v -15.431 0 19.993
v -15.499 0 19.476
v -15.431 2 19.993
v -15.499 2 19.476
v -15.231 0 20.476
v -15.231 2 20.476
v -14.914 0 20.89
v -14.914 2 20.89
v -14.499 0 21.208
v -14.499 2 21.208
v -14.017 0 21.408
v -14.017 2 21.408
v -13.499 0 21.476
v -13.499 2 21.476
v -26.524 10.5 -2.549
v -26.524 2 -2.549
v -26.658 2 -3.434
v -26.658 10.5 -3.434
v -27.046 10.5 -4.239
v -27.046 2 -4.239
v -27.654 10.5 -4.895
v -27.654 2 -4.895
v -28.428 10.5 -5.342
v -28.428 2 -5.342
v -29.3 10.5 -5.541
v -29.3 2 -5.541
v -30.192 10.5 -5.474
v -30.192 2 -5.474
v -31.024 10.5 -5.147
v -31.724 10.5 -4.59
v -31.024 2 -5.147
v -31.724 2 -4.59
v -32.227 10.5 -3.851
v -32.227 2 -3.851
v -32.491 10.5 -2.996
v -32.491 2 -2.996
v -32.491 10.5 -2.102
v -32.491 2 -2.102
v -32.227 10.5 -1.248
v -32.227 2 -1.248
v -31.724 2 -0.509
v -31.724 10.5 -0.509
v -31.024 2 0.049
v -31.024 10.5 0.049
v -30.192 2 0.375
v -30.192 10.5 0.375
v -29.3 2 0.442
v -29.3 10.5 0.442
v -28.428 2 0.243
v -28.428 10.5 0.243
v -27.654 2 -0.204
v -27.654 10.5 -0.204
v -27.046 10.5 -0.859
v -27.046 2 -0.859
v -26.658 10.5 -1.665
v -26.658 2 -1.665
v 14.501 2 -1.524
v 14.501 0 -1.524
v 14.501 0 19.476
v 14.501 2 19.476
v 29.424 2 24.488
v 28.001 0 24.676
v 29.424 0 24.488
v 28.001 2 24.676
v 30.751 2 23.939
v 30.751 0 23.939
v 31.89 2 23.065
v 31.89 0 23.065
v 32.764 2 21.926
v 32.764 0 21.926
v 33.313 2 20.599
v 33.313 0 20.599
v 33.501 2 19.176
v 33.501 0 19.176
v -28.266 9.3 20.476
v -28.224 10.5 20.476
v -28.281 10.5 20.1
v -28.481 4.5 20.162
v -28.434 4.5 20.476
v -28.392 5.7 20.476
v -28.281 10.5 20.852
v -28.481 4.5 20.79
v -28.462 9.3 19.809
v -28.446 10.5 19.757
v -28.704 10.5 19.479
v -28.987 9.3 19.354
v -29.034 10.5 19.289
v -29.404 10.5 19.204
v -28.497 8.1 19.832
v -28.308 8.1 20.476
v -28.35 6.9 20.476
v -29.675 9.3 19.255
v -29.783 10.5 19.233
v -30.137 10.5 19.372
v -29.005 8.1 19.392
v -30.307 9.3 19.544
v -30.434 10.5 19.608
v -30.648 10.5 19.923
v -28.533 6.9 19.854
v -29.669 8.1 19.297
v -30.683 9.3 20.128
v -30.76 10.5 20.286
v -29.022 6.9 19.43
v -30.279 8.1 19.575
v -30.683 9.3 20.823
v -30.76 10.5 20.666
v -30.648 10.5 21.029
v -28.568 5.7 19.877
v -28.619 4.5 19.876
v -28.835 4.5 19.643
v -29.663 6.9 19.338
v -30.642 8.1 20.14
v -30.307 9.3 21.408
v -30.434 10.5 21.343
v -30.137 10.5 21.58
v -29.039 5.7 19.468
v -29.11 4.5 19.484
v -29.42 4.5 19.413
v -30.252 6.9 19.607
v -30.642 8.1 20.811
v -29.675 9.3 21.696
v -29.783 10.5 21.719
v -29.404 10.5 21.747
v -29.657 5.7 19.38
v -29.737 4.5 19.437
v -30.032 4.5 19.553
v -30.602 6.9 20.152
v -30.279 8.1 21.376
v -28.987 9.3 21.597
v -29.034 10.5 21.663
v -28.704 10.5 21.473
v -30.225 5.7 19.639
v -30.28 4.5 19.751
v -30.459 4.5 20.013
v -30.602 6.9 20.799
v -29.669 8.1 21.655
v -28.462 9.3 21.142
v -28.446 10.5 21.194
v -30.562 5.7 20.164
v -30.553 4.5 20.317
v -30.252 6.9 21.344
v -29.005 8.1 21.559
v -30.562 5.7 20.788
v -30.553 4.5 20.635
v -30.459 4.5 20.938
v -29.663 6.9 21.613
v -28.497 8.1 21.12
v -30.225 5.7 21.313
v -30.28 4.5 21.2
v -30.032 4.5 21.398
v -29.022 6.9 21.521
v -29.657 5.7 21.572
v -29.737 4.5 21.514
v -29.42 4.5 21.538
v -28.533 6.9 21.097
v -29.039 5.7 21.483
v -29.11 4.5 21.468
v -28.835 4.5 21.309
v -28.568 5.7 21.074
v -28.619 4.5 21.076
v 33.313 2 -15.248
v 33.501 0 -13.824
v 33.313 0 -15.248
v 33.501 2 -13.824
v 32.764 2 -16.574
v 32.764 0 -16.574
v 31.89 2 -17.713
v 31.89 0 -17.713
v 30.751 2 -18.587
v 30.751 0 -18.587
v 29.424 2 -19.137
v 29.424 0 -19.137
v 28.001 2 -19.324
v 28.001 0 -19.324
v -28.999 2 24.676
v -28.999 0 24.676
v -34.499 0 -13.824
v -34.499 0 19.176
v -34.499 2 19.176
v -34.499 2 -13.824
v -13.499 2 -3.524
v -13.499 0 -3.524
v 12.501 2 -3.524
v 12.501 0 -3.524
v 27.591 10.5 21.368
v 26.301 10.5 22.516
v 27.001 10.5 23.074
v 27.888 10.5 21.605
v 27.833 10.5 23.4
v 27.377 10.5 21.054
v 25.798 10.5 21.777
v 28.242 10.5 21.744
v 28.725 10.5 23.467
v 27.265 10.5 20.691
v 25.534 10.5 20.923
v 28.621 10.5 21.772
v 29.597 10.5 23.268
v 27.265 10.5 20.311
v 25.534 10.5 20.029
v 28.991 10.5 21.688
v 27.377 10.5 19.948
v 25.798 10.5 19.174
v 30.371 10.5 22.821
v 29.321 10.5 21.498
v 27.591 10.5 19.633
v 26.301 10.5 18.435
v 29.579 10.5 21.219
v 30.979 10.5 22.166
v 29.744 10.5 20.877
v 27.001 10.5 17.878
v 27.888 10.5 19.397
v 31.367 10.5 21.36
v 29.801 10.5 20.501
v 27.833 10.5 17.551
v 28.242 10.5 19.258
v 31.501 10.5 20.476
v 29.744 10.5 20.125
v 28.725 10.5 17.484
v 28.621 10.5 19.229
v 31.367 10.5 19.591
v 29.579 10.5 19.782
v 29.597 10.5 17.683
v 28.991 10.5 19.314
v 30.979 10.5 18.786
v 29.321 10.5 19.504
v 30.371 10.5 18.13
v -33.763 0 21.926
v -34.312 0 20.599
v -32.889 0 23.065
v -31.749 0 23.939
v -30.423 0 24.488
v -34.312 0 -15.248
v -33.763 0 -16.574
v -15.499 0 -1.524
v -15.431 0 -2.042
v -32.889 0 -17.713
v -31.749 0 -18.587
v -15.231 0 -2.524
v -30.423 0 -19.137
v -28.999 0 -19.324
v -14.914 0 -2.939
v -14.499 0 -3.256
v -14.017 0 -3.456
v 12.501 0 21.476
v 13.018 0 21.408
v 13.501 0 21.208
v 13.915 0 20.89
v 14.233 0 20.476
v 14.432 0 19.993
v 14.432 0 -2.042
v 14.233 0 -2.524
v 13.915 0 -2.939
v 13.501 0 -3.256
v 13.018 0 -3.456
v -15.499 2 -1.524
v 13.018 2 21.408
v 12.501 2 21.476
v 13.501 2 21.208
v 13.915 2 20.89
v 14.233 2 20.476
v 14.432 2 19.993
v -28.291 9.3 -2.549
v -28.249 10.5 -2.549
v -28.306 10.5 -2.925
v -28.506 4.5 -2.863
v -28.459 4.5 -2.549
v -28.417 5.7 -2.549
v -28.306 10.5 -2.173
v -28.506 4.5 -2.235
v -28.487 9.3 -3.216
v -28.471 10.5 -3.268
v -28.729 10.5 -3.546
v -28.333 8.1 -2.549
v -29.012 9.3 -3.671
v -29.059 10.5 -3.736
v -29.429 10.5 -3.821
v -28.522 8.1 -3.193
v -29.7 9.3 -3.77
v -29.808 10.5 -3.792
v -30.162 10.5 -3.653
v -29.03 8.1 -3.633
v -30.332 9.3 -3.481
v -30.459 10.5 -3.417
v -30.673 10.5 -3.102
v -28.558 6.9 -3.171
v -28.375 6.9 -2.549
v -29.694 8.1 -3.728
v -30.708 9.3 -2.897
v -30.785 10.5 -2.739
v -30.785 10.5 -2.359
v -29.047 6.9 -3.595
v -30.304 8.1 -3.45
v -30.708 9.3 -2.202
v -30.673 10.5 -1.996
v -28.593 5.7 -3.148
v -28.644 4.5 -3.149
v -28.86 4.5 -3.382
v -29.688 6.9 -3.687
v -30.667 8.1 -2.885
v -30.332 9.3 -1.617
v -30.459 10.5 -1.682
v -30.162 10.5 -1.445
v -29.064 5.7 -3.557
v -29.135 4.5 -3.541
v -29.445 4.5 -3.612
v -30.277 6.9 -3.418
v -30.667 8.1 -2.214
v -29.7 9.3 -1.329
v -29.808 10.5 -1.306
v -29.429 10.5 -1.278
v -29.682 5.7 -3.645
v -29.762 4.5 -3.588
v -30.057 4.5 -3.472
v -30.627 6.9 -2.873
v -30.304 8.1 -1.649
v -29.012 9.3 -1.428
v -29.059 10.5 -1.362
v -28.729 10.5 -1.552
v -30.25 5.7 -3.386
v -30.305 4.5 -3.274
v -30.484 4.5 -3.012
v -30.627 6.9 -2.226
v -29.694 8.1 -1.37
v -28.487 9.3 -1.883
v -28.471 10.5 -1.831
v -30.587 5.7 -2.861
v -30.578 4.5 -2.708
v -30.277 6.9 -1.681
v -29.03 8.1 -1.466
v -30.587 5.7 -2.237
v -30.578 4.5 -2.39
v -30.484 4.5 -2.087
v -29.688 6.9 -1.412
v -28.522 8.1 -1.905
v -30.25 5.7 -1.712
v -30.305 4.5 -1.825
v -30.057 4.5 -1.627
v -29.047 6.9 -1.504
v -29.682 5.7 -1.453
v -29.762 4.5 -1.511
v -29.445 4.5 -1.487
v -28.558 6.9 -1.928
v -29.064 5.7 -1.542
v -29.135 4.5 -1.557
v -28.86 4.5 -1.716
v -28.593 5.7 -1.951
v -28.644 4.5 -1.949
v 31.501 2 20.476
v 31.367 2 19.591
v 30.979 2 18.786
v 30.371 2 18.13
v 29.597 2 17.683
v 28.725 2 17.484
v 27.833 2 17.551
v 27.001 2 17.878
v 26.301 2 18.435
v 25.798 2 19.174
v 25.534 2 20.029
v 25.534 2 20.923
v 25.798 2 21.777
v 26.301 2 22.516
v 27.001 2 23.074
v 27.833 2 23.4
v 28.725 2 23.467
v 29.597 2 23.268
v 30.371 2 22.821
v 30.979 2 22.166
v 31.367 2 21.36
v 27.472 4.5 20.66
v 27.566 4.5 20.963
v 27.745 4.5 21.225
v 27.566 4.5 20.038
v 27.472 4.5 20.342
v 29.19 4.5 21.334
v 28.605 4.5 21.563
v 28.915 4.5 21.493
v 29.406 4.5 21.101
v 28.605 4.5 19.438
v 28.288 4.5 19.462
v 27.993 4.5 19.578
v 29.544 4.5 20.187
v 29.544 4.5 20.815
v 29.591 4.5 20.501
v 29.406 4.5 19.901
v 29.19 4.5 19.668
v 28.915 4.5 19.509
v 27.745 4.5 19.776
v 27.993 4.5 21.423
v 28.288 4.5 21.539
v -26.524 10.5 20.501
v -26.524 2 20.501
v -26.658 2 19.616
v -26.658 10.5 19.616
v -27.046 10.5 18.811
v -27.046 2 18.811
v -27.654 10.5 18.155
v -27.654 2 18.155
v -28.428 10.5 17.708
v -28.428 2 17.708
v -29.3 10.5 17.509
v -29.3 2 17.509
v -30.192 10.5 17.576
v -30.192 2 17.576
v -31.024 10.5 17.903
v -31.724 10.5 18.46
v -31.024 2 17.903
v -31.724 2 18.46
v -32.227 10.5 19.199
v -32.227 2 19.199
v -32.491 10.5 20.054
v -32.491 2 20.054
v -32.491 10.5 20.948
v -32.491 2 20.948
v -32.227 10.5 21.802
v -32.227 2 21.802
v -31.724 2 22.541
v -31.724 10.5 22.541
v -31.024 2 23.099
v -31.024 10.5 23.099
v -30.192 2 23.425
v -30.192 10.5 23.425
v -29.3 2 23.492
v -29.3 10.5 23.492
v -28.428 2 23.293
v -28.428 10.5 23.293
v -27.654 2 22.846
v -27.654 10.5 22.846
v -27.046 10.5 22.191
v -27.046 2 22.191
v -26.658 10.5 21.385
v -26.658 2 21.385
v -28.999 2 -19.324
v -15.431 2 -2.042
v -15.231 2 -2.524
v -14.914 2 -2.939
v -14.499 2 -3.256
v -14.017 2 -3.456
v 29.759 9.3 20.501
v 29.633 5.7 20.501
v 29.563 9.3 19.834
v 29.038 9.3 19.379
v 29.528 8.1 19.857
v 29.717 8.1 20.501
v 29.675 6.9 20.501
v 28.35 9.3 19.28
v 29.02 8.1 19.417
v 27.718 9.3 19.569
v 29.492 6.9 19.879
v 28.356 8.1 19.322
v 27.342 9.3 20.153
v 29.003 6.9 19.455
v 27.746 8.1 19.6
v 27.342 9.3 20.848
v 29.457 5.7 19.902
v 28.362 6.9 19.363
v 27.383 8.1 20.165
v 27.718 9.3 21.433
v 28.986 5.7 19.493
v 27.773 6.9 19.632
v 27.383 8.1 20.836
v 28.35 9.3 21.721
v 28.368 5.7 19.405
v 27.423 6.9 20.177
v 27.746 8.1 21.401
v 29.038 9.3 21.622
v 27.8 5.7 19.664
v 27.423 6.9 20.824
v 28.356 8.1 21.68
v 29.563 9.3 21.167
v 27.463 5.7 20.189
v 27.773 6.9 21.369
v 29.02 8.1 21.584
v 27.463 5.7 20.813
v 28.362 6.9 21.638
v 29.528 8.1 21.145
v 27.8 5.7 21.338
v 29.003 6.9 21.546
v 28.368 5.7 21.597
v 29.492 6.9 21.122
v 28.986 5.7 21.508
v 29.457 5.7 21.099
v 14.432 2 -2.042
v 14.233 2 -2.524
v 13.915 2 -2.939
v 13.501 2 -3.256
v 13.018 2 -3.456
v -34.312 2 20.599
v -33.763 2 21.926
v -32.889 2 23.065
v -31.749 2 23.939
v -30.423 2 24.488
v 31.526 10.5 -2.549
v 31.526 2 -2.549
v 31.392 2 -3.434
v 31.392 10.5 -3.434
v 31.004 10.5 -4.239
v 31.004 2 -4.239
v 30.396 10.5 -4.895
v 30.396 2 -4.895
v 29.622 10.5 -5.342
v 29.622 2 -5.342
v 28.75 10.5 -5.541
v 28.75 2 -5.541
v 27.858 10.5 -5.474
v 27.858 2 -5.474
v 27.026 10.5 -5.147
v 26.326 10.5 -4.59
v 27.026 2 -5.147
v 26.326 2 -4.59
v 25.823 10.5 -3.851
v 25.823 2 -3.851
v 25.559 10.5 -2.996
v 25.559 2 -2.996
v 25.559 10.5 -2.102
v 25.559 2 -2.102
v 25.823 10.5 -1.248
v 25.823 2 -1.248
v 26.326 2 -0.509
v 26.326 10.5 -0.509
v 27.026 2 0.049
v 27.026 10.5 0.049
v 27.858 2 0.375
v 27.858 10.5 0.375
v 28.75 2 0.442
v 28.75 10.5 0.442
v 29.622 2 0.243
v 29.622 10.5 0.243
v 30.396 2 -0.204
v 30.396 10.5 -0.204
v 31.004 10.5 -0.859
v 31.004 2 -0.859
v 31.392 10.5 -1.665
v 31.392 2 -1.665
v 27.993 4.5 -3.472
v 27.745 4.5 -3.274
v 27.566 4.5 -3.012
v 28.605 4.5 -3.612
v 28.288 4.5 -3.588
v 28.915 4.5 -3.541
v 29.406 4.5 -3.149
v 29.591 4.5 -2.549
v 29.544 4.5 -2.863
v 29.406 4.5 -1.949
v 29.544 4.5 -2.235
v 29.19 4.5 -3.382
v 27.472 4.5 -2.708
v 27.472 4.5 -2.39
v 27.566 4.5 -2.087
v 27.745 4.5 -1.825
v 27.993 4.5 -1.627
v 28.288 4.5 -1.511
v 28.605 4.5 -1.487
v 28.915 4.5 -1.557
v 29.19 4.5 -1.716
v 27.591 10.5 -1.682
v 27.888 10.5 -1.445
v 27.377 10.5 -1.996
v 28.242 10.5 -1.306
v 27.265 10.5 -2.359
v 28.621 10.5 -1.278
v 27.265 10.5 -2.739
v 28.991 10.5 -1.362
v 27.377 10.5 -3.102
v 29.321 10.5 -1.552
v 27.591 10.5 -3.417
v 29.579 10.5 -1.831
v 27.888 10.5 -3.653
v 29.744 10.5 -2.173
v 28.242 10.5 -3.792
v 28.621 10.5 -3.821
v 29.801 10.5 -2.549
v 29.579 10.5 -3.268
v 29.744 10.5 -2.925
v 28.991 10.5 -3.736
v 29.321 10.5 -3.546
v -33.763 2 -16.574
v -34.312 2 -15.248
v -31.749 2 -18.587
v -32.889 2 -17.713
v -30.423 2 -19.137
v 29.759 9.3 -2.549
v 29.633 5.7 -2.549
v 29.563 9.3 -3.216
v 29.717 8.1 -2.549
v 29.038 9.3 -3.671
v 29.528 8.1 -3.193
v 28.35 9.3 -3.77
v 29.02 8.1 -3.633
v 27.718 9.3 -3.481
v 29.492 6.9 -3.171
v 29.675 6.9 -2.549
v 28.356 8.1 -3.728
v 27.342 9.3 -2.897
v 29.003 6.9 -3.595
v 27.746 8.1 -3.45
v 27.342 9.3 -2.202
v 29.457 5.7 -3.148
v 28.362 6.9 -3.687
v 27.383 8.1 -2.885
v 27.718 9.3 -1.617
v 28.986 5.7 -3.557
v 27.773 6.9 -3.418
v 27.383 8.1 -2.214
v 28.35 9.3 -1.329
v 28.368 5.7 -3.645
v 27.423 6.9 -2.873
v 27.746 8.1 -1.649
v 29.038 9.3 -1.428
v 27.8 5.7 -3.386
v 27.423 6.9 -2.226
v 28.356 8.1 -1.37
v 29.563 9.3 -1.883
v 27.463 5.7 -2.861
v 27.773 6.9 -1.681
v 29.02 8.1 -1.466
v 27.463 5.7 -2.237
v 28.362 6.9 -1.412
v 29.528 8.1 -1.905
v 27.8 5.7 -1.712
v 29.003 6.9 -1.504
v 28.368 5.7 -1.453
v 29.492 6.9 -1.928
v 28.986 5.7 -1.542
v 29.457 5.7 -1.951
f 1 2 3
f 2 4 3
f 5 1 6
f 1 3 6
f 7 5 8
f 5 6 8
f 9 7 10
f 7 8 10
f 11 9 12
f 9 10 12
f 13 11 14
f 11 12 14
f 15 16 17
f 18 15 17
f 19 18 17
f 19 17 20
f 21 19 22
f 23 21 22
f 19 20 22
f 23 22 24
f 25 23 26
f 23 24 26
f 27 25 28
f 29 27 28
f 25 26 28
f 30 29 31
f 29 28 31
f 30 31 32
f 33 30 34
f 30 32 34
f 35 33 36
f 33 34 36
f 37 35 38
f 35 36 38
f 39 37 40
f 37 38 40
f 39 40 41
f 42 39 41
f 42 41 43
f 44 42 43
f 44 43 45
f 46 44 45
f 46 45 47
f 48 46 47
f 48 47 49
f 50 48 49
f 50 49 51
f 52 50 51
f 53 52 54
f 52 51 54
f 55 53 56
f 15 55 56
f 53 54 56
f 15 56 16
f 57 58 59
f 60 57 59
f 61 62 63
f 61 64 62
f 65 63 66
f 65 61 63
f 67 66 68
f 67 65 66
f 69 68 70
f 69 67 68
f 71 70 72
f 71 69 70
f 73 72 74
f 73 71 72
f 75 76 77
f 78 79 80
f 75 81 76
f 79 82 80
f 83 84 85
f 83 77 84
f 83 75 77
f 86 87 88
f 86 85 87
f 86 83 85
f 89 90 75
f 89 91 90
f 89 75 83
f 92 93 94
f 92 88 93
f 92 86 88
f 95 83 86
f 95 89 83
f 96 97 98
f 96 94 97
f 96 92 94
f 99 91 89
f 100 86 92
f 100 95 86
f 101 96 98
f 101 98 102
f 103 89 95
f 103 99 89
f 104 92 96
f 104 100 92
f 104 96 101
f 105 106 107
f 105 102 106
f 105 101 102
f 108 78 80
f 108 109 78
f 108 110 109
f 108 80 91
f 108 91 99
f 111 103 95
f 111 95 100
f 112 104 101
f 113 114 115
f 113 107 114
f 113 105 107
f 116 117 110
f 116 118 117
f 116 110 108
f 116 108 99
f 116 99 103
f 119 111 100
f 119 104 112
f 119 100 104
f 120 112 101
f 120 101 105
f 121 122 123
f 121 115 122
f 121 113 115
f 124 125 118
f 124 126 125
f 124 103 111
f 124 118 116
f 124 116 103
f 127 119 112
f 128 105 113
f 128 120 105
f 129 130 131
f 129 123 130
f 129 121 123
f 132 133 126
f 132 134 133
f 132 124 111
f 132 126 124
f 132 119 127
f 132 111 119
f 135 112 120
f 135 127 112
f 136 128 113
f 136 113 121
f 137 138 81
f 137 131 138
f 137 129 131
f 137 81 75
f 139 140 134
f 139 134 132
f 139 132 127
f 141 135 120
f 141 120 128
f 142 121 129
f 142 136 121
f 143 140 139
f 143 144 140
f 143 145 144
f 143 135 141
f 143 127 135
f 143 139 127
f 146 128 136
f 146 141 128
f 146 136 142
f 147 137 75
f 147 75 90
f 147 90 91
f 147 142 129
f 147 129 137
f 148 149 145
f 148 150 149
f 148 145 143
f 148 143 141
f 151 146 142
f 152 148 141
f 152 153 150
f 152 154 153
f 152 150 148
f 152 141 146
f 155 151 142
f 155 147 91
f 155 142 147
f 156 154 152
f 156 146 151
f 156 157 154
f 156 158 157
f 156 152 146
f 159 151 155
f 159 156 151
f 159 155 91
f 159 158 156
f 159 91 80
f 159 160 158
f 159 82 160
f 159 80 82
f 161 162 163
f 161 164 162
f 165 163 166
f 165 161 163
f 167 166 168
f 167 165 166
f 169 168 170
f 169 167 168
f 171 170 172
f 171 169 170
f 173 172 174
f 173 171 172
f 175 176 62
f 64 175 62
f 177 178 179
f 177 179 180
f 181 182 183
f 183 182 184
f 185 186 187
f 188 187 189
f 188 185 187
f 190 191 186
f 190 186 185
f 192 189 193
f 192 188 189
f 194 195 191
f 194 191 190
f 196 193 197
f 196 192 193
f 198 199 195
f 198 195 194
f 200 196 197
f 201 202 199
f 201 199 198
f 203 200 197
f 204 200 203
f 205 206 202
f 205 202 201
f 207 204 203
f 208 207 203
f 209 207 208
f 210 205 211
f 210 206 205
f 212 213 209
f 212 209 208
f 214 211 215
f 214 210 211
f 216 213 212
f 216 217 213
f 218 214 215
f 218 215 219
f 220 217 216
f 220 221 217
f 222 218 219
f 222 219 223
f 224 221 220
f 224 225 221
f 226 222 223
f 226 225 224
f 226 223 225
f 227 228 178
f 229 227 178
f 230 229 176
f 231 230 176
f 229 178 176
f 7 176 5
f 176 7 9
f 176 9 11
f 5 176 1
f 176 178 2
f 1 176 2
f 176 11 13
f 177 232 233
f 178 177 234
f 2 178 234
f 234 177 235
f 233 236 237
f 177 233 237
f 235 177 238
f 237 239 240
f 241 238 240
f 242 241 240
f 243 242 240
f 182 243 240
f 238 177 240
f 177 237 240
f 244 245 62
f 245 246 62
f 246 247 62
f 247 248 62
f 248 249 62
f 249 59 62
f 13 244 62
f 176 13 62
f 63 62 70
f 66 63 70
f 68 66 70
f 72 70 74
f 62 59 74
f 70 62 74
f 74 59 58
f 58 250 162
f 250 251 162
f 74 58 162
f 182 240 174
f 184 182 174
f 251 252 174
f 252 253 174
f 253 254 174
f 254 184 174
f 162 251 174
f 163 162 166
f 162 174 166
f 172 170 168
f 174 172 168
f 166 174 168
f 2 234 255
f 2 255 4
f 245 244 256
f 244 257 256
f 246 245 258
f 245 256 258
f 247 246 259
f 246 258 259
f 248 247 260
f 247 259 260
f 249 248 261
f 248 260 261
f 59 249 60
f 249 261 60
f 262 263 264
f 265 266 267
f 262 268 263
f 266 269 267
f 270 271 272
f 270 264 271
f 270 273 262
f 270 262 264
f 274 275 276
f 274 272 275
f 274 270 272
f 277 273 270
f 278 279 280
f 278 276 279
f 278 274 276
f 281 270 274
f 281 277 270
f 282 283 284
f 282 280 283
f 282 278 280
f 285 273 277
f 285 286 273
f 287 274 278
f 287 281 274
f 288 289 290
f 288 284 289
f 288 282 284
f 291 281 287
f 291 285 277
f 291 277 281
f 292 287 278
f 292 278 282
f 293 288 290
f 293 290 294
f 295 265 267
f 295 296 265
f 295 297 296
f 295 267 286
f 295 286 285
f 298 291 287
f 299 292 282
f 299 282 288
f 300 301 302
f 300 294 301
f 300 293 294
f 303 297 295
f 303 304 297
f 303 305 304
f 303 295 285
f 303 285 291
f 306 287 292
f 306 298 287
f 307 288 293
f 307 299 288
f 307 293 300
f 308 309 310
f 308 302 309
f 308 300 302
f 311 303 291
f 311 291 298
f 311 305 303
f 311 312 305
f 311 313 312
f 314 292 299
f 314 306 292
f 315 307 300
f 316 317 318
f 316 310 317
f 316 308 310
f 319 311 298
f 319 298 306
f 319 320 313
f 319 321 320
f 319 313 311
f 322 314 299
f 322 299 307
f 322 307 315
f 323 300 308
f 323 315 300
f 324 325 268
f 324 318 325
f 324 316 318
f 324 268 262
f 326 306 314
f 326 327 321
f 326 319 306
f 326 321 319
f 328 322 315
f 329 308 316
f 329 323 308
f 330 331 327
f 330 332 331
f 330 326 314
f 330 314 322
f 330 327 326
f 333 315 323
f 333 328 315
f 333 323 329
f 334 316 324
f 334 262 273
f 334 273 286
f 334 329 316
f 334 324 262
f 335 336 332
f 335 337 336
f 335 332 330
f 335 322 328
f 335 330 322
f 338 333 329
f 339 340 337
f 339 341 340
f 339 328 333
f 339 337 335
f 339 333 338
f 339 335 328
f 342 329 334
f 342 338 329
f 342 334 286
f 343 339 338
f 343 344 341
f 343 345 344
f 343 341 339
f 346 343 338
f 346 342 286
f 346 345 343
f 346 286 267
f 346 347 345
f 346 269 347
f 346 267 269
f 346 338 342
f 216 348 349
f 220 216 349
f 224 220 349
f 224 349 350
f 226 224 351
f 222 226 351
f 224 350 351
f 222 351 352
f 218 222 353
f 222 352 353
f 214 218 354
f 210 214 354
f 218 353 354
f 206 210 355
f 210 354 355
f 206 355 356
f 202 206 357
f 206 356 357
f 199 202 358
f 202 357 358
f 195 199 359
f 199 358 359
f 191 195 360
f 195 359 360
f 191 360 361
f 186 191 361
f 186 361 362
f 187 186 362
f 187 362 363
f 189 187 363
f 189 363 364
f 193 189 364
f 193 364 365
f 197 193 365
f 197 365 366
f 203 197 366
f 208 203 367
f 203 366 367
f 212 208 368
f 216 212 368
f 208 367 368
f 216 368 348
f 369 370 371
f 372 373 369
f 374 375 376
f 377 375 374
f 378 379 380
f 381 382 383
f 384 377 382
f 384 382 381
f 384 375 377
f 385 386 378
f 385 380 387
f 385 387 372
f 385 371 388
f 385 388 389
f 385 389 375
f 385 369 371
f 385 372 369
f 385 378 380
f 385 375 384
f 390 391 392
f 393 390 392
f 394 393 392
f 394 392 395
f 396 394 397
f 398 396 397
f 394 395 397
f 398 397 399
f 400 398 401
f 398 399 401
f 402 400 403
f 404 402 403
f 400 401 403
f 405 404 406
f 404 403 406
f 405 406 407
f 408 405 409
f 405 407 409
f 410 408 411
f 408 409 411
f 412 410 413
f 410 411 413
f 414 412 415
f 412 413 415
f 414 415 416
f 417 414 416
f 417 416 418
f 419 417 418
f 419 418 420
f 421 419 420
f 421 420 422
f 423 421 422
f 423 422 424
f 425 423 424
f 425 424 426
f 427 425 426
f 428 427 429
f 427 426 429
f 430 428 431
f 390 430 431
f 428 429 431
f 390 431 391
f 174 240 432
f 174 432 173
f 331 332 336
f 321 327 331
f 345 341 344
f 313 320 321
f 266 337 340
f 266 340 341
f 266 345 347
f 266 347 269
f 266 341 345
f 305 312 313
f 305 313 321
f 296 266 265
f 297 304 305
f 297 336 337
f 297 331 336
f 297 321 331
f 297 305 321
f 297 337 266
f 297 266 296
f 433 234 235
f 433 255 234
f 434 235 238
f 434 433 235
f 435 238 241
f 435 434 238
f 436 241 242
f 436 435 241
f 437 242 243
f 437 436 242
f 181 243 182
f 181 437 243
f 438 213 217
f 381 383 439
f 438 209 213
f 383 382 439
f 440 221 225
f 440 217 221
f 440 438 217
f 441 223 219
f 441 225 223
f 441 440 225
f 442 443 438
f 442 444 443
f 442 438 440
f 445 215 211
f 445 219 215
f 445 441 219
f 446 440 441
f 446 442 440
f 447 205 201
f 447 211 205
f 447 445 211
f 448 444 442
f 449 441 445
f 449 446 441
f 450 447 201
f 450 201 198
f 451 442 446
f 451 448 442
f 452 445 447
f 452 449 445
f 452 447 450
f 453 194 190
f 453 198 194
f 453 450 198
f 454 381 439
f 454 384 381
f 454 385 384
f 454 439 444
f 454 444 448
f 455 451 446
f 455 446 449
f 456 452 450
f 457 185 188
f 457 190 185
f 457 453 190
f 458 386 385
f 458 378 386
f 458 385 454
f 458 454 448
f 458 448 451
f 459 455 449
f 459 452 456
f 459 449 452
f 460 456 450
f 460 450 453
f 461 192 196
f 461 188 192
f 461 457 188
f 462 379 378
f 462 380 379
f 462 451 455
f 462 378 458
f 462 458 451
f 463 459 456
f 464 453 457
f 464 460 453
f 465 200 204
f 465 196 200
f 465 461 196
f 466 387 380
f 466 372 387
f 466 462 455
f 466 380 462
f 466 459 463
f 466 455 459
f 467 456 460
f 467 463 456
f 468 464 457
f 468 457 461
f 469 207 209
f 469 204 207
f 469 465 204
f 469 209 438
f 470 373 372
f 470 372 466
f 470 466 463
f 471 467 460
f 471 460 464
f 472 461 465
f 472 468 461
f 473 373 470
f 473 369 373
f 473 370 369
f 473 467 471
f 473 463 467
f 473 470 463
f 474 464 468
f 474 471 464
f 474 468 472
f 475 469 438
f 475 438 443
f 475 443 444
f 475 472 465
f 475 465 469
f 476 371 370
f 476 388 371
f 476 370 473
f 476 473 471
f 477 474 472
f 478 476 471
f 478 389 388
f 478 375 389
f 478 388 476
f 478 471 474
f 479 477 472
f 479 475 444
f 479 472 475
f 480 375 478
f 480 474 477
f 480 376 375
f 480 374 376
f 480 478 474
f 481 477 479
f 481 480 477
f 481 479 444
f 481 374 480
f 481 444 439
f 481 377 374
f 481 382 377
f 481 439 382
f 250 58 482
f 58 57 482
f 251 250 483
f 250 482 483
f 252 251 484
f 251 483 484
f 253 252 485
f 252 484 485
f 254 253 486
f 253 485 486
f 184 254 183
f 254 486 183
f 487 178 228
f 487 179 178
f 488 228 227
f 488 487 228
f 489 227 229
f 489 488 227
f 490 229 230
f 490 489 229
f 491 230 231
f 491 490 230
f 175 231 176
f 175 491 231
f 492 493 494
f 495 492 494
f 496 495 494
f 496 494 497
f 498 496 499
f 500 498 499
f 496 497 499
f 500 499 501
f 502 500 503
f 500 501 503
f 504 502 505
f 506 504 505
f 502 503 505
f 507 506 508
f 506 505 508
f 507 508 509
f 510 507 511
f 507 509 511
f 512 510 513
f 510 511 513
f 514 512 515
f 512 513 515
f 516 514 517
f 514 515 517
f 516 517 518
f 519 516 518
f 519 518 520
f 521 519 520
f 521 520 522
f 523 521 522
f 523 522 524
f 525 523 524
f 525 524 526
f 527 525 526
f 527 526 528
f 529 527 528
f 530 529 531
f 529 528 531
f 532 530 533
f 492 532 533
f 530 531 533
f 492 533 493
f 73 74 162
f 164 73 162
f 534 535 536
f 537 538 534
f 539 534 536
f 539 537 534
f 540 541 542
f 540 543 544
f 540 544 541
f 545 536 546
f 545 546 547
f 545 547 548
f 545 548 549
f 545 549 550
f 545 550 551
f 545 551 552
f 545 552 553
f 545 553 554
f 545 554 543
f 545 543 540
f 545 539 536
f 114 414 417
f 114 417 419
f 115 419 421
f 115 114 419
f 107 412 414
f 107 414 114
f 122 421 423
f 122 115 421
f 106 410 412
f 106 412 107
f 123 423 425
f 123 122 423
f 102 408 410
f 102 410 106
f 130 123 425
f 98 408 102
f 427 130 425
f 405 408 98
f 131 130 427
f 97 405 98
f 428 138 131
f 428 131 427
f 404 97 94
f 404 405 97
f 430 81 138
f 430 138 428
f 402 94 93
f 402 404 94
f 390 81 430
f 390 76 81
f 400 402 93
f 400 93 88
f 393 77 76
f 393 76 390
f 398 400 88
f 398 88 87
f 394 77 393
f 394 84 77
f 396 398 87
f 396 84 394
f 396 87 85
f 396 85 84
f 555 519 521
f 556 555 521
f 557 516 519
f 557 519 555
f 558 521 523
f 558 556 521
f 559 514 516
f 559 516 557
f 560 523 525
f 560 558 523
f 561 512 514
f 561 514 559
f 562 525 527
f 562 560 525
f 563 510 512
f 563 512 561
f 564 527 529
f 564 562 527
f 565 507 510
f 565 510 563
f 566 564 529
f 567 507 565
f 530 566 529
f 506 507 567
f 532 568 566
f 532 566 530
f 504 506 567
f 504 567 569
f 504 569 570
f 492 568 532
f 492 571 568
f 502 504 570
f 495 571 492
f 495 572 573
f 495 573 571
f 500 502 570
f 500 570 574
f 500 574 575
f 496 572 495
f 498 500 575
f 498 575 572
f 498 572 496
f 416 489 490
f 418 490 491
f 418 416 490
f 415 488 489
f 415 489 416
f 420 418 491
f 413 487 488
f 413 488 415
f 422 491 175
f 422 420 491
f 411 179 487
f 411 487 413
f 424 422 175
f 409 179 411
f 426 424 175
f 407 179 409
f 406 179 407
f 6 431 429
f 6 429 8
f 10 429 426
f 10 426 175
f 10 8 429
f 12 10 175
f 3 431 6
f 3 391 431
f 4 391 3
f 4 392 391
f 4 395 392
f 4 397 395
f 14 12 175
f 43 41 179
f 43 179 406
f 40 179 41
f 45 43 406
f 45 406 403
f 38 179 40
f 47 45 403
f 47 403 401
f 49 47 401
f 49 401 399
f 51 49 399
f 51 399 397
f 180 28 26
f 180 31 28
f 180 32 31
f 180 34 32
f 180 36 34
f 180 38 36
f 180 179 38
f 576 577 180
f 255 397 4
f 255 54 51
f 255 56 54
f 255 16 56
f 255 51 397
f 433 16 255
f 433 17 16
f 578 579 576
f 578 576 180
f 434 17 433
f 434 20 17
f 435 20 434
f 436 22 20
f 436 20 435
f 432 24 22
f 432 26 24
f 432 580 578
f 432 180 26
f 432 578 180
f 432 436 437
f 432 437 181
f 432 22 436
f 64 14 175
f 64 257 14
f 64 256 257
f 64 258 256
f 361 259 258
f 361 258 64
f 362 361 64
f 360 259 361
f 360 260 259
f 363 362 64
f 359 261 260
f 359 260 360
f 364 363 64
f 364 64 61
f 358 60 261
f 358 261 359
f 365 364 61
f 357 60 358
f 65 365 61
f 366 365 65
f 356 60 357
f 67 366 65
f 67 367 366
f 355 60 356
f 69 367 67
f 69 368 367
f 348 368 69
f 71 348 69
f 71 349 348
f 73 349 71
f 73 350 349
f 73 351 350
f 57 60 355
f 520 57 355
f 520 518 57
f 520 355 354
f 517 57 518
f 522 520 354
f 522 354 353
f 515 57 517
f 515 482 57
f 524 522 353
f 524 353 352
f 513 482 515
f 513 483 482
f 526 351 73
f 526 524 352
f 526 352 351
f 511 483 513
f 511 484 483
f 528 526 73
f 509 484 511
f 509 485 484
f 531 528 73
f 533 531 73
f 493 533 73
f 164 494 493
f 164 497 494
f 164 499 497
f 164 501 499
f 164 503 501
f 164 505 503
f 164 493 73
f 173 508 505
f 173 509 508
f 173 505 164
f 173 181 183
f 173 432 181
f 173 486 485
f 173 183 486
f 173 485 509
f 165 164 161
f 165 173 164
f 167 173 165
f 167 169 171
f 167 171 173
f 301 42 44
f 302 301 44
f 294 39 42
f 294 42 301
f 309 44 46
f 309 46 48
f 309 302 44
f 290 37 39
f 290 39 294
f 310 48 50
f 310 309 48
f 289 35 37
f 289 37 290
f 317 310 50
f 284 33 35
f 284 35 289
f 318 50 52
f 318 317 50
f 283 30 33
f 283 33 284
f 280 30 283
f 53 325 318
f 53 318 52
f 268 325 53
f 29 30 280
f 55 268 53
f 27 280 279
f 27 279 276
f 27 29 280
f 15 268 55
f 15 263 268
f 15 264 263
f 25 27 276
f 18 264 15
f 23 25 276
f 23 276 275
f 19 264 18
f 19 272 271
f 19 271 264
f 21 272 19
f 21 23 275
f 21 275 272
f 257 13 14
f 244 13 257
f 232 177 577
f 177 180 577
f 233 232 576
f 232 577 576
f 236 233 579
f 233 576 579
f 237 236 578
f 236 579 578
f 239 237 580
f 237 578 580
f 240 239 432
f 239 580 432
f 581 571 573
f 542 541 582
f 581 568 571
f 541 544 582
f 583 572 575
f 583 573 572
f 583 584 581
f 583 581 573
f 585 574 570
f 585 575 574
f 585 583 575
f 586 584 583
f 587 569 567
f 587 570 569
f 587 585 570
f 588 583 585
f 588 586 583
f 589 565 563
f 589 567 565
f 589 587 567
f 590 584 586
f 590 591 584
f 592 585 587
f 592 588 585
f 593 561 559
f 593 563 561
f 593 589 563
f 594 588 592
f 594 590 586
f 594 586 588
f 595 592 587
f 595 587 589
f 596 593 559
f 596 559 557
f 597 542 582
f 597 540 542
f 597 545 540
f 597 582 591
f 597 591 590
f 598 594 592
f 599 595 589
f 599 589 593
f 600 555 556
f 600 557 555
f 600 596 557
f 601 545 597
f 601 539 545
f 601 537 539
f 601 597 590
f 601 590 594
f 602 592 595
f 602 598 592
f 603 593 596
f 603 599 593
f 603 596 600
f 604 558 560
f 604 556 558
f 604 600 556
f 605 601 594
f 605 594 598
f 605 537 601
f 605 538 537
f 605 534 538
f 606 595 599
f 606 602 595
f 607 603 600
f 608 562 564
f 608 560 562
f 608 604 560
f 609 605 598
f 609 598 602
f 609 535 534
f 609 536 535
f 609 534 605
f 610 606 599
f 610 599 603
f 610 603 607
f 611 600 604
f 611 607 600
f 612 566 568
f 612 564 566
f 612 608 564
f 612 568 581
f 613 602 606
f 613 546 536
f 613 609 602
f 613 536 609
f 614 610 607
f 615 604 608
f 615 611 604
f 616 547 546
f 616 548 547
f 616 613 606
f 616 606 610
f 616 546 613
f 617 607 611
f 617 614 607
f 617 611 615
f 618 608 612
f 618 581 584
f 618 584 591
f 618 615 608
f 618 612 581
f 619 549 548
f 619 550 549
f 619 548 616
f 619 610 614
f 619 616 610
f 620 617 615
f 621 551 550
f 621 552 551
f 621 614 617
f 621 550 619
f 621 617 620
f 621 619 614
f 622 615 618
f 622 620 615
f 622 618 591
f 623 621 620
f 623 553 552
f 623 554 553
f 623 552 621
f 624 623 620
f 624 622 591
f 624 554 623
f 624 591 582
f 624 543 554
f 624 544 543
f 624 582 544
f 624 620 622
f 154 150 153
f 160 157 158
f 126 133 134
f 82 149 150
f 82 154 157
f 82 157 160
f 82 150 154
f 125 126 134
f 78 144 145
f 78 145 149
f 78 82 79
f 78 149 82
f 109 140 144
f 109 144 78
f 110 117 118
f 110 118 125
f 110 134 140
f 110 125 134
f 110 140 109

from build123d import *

# Parameters (mm, degrees)
SKETCH_1_W          = 68
SKETCH_1_H          = 44
EXTRUDE_1_DEPTH     = 2
FILLET_1_R          = 5.5
SKETCH_2_W          = 30
SKETCH_2_H          = 25
CUT_EXTRUDE_1_DEPTH = 3
FILLET_2_R          = 2
SKETCH_3_R          = 3
EXTRUDE_2_DEPTH     = 8.5
SKETCH_4_R          = 1.275
CUT_EXTRUDE_2_DEPTH = 6
CUT_EXTRUDE_2_TAPER = 2


with BuildPart() as part:
    # 草图1 → 凸台-拉伸1 (new body)
    with BuildSketch(Plane(origin=(0, 0, 0), x_dir=(1, 0, 0), z_dir=(0, 1, 0))):
        with Locations((-0.499435028, -2.675706215)):
            Rectangle(SKETCH_1_W, SKETCH_1_H)
    extrude(amount=EXTRUDE_1_DEPTH)

    # 圆角1
    fillet_1_edges = [part.edges().sort_by_distance(p)[0] for p in [
        (-34.499435028, 1, -19.324293785),
        (33.500564972, 1, -19.324293785),
        (33.500564972, 1, 24.675706215),
        (-34.499435028, 1, 24.675706215),
    ]]
    fillet(fillet_1_edges, radius=FILLET_1_R)

    # 草图2 → 切除-拉伸1 (cut, through all)
    with BuildSketch(Plane.XZ):
        with Locations((-0.499435028, 8.975706215)):
            Rectangle(SKETCH_2_W, SKETCH_2_H)
    extrude(amount=-CUT_EXTRUDE_1_DEPTH, mode=Mode.SUBTRACT)

    # 圆角2
    fillet_2_edges = [part.edges().sort_by_distance(p)[0] for p in [
        (14.500564972, 1, 21.475706215),
        (14.500564972, 1, -3.524293785),
        (-15.499435028, 1, -3.524293785),
        (-15.499435028, 1, 21.475706215),
    ]]
    fillet(fillet_2_edges, radius=FILLET_2_R)

    # 草图3 → 凸台-拉伸2 (add)
    with BuildSketch(Plane(origin=(0, 2, 0), x_dir=(1, 0, 0), z_dir=(0, 1, 0))):
        with Locations((-29.524435028, 2.549293785)):
            Circle(SKETCH_3_R)
        with Locations((-29.524435028, -20.500706215)):
            Circle(SKETCH_3_R)
        with Locations((28.500564972, -20.475706215)):
            Circle(SKETCH_3_R)
        with Locations((28.525564972, 2.549293785)):
            Circle(SKETCH_3_R)
    extrude(amount=EXTRUDE_2_DEPTH)

    # 草图4 → 切除-拉伸2 (cut)
    with BuildSketch(Plane(origin=(0, 10.5, 0), x_dir=(1, 0, 0), z_dir=(0, 1, 0))):
        with Locations((-29.524435028, 2.549293785)):
            Circle(SKETCH_4_R)
        with Locations((-29.499435028, -20.475706215)):
            Circle(SKETCH_4_R)
        with Locations((28.525564972, -20.500706215)):
            Circle(SKETCH_4_R)
        with Locations((28.525564972, 2.549293785)):
            Circle(SKETCH_4_R)
    extrude(amount=-CUT_EXTRUDE_2_DEPTH, taper=CUT_EXTRUDE_2_TAPER, mode=Mode.SUBTRACT)


solid = part.part
